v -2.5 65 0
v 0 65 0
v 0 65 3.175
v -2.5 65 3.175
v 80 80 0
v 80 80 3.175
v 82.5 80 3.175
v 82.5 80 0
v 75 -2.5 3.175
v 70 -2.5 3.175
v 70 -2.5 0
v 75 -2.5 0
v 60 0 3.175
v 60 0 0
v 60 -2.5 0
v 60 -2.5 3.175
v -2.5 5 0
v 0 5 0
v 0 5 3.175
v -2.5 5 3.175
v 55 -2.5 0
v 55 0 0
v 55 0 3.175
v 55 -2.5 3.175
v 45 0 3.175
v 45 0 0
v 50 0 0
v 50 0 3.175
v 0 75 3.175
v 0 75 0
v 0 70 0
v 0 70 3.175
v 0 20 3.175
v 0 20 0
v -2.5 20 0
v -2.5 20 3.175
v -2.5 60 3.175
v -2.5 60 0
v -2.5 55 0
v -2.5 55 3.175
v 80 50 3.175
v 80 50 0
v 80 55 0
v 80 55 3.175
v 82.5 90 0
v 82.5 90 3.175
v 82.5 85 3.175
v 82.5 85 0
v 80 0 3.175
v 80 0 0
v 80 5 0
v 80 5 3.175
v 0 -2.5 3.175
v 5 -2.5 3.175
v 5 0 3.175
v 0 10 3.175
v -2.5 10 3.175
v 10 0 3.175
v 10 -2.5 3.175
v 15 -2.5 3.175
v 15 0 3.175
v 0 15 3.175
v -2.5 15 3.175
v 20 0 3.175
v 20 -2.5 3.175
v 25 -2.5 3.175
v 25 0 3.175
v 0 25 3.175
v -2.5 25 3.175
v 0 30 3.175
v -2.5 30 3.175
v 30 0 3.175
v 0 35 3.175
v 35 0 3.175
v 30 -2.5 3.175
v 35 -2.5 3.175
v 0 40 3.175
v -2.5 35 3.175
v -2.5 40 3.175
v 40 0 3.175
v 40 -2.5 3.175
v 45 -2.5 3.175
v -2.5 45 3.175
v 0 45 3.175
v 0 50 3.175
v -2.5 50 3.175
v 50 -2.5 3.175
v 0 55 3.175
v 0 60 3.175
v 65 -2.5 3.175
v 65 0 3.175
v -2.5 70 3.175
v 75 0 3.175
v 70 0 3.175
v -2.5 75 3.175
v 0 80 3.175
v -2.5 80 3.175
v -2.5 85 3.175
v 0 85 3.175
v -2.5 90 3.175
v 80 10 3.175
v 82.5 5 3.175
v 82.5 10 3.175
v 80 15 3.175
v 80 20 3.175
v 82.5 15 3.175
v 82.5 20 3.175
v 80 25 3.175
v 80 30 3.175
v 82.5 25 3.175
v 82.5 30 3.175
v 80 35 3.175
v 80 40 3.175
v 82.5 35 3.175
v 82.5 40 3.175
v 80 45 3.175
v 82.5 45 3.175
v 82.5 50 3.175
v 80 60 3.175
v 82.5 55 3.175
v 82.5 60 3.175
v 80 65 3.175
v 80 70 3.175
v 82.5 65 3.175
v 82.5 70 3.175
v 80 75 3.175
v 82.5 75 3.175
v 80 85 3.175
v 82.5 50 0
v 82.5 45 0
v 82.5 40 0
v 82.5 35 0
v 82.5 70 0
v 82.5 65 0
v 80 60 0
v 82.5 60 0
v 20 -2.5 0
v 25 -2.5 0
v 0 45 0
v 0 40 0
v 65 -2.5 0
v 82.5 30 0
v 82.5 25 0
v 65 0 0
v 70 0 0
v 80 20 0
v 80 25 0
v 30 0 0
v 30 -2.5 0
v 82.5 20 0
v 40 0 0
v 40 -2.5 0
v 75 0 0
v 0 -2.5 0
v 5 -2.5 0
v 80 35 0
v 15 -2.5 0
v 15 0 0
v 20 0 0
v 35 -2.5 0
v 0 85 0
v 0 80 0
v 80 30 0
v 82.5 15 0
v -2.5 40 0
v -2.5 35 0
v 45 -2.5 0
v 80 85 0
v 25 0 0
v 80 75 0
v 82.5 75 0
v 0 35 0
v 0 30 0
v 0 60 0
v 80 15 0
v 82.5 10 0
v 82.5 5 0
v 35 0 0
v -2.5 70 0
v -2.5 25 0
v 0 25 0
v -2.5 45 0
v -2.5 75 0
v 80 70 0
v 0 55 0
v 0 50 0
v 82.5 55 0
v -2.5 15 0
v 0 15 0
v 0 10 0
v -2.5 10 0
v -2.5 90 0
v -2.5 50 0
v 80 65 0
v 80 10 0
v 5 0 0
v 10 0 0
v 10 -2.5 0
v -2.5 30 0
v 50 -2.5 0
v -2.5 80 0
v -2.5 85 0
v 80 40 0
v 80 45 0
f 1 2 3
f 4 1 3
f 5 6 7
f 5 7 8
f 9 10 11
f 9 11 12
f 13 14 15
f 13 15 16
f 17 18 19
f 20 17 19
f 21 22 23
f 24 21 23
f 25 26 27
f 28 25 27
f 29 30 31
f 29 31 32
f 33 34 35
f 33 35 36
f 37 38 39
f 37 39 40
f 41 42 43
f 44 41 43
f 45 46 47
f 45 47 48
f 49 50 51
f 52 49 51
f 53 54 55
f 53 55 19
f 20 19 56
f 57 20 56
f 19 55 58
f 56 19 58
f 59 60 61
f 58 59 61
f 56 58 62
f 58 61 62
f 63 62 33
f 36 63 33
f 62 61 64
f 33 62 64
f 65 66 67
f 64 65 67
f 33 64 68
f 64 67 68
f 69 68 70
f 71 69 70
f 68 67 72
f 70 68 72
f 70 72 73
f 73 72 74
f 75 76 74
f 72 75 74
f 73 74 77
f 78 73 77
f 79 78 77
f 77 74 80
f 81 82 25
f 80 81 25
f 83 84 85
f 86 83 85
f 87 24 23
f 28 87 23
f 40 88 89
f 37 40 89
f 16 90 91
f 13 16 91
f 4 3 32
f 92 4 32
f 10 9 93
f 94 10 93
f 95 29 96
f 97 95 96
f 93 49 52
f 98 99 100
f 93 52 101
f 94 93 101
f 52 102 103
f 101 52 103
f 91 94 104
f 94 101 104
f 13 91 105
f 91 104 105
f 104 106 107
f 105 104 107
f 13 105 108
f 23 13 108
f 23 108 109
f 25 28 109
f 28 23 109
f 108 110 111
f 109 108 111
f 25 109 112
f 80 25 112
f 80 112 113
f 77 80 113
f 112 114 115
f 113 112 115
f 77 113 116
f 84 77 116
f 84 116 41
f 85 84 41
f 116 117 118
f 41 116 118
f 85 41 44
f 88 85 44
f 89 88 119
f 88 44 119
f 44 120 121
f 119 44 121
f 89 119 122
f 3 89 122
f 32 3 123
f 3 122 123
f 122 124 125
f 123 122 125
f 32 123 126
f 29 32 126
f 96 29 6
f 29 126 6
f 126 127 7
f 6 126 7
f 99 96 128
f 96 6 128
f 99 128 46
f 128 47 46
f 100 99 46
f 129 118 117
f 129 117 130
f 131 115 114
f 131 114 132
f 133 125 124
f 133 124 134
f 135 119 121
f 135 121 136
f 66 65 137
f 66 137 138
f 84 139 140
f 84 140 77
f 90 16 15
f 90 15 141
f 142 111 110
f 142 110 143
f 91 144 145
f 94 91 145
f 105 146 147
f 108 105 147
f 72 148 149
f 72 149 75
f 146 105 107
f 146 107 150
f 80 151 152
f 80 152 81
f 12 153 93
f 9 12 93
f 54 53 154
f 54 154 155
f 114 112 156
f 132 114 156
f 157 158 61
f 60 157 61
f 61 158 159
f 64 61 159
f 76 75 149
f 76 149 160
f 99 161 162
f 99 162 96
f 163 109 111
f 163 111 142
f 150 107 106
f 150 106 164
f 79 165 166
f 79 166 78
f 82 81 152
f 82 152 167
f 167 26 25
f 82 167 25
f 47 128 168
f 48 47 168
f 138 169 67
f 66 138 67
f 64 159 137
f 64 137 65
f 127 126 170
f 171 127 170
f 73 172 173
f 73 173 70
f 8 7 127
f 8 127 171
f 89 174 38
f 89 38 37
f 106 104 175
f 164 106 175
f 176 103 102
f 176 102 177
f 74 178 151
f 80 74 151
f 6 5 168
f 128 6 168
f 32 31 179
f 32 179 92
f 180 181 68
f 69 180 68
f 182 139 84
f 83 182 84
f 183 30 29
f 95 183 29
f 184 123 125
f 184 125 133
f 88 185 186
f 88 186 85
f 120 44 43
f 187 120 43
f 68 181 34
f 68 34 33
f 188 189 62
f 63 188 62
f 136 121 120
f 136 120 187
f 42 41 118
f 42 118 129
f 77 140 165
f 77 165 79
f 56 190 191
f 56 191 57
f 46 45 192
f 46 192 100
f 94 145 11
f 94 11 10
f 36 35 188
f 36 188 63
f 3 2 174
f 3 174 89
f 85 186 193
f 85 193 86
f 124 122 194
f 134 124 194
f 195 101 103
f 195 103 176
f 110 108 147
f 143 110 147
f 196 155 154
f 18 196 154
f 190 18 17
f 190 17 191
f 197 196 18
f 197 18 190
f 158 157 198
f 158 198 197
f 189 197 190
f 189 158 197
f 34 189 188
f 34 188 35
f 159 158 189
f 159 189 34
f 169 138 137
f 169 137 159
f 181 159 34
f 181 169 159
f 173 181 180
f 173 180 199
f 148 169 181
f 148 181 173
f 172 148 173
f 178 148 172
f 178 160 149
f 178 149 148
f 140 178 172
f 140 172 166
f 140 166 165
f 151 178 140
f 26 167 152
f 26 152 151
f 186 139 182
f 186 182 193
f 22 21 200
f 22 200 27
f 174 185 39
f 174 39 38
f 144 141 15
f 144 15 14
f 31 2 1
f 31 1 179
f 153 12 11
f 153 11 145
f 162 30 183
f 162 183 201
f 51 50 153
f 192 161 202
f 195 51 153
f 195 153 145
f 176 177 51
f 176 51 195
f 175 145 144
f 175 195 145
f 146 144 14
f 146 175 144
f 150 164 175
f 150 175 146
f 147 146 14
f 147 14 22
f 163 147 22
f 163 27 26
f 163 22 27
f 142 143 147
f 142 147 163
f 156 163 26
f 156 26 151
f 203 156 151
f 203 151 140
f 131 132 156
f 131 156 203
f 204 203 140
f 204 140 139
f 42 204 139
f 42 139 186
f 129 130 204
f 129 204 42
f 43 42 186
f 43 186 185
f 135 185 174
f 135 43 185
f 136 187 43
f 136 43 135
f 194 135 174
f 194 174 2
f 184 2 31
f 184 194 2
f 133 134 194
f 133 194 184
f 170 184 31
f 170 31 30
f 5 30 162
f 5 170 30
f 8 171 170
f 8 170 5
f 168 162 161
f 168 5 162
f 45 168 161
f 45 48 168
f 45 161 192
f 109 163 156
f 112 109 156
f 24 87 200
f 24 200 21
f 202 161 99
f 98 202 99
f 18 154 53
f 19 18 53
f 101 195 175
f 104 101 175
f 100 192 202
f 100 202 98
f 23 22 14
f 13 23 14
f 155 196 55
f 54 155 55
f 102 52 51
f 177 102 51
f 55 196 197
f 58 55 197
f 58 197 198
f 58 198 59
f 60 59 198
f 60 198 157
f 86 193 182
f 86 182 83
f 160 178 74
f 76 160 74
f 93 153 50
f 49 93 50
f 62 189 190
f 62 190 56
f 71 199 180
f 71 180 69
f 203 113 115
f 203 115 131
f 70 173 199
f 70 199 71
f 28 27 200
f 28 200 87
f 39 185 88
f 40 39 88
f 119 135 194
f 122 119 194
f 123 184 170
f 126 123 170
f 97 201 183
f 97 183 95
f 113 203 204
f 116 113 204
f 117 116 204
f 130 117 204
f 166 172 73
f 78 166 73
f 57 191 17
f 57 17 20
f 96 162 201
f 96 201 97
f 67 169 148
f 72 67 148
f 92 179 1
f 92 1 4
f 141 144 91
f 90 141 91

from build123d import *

# Parameters (mm, degrees)
SKETCH1_W           = 80
SKETCH1_H           = 90
BOSS_EXTRUDE1_DEPTH = 3.175
SKETCH2_W           = 5
SKETCH2_H           = 3.175
BOSS_EXTRUDE2_DEPTH = 2.5
SKETCH3_W           = 3.175
SKETCH3_H           = 5
BOSS_EXTRUDE3_DEPTH = 2.5
SKETCH4_W           = 3.175
SKETCH4_H           = 5
BOSS_EXTRUDE4_DEPTH = 2.5
LPATTERN1_COUNT     = 9
LPATTERN1_PITCH     = 10
LPATTERN2_COUNT     = 8
LPATTERN2_PITCH     = 10
LPATTERN3_COUNT     = 9
LPATTERN3_PITCH     = 10


with BuildPart() as part:
    # Sketch1 → Boss-Extrude1 (new body)
    with BuildSketch(Plane.XY):
        with Locations((40, 45)):
            Rectangle(SKETCH1_W, SKETCH1_H)
    extrude(amount=BOSS_EXTRUDE1_DEPTH)

    # Sketch2 → Boss-Extrude2 (add)
    with BuildSketch(Plane.XZ):
        with Locations((2.5, 1.5875)):
            Rectangle(SKETCH2_W, SKETCH2_H)
    boss_extrude2 = extrude(amount=BOSS_EXTRUDE2_DEPTH)

    # Sketch3 → Boss-Extrude3 (add)
    with BuildSketch(Plane(origin=(80, 0, 0), x_dir=(0, 0, -1), z_dir=(1, 0, 0))):
        with Locations((-1.5875, 87.5)):
            Rectangle(SKETCH3_W, SKETCH3_H)
    boss_extrude3 = extrude(amount=BOSS_EXTRUDE3_DEPTH)

    # Sketch4 → Boss-Extrude4 (add)
    with BuildSketch(Plane.ZY):
        with Locations((1.5875, 87.5)):
            Rectangle(SKETCH4_W, SKETCH4_H)
    boss_extrude4 = extrude(amount=BOSS_EXTRUDE4_DEPTH)

    # LPattern1: Boss-Extrude4 ×9
    with Locations(*[(0, -i * LPATTERN1_PITCH, 0) for i in range(1, LPATTERN1_COUNT)]):
        add(boss_extrude4)

    # LPattern2: Boss-Extrude2 ×8
    with Locations(*[(i * LPATTERN2_PITCH, 0, 0) for i in range(1, LPATTERN2_COUNT)]):
        add(boss_extrude2)

    # LPattern3: Boss-Extrude3 ×9
    with Locations(*[(0, -i * LPATTERN3_PITCH, 0) for i in range(1, LPATTERN3_COUNT)]):
        add(boss_extrude3)


solid = part.part
